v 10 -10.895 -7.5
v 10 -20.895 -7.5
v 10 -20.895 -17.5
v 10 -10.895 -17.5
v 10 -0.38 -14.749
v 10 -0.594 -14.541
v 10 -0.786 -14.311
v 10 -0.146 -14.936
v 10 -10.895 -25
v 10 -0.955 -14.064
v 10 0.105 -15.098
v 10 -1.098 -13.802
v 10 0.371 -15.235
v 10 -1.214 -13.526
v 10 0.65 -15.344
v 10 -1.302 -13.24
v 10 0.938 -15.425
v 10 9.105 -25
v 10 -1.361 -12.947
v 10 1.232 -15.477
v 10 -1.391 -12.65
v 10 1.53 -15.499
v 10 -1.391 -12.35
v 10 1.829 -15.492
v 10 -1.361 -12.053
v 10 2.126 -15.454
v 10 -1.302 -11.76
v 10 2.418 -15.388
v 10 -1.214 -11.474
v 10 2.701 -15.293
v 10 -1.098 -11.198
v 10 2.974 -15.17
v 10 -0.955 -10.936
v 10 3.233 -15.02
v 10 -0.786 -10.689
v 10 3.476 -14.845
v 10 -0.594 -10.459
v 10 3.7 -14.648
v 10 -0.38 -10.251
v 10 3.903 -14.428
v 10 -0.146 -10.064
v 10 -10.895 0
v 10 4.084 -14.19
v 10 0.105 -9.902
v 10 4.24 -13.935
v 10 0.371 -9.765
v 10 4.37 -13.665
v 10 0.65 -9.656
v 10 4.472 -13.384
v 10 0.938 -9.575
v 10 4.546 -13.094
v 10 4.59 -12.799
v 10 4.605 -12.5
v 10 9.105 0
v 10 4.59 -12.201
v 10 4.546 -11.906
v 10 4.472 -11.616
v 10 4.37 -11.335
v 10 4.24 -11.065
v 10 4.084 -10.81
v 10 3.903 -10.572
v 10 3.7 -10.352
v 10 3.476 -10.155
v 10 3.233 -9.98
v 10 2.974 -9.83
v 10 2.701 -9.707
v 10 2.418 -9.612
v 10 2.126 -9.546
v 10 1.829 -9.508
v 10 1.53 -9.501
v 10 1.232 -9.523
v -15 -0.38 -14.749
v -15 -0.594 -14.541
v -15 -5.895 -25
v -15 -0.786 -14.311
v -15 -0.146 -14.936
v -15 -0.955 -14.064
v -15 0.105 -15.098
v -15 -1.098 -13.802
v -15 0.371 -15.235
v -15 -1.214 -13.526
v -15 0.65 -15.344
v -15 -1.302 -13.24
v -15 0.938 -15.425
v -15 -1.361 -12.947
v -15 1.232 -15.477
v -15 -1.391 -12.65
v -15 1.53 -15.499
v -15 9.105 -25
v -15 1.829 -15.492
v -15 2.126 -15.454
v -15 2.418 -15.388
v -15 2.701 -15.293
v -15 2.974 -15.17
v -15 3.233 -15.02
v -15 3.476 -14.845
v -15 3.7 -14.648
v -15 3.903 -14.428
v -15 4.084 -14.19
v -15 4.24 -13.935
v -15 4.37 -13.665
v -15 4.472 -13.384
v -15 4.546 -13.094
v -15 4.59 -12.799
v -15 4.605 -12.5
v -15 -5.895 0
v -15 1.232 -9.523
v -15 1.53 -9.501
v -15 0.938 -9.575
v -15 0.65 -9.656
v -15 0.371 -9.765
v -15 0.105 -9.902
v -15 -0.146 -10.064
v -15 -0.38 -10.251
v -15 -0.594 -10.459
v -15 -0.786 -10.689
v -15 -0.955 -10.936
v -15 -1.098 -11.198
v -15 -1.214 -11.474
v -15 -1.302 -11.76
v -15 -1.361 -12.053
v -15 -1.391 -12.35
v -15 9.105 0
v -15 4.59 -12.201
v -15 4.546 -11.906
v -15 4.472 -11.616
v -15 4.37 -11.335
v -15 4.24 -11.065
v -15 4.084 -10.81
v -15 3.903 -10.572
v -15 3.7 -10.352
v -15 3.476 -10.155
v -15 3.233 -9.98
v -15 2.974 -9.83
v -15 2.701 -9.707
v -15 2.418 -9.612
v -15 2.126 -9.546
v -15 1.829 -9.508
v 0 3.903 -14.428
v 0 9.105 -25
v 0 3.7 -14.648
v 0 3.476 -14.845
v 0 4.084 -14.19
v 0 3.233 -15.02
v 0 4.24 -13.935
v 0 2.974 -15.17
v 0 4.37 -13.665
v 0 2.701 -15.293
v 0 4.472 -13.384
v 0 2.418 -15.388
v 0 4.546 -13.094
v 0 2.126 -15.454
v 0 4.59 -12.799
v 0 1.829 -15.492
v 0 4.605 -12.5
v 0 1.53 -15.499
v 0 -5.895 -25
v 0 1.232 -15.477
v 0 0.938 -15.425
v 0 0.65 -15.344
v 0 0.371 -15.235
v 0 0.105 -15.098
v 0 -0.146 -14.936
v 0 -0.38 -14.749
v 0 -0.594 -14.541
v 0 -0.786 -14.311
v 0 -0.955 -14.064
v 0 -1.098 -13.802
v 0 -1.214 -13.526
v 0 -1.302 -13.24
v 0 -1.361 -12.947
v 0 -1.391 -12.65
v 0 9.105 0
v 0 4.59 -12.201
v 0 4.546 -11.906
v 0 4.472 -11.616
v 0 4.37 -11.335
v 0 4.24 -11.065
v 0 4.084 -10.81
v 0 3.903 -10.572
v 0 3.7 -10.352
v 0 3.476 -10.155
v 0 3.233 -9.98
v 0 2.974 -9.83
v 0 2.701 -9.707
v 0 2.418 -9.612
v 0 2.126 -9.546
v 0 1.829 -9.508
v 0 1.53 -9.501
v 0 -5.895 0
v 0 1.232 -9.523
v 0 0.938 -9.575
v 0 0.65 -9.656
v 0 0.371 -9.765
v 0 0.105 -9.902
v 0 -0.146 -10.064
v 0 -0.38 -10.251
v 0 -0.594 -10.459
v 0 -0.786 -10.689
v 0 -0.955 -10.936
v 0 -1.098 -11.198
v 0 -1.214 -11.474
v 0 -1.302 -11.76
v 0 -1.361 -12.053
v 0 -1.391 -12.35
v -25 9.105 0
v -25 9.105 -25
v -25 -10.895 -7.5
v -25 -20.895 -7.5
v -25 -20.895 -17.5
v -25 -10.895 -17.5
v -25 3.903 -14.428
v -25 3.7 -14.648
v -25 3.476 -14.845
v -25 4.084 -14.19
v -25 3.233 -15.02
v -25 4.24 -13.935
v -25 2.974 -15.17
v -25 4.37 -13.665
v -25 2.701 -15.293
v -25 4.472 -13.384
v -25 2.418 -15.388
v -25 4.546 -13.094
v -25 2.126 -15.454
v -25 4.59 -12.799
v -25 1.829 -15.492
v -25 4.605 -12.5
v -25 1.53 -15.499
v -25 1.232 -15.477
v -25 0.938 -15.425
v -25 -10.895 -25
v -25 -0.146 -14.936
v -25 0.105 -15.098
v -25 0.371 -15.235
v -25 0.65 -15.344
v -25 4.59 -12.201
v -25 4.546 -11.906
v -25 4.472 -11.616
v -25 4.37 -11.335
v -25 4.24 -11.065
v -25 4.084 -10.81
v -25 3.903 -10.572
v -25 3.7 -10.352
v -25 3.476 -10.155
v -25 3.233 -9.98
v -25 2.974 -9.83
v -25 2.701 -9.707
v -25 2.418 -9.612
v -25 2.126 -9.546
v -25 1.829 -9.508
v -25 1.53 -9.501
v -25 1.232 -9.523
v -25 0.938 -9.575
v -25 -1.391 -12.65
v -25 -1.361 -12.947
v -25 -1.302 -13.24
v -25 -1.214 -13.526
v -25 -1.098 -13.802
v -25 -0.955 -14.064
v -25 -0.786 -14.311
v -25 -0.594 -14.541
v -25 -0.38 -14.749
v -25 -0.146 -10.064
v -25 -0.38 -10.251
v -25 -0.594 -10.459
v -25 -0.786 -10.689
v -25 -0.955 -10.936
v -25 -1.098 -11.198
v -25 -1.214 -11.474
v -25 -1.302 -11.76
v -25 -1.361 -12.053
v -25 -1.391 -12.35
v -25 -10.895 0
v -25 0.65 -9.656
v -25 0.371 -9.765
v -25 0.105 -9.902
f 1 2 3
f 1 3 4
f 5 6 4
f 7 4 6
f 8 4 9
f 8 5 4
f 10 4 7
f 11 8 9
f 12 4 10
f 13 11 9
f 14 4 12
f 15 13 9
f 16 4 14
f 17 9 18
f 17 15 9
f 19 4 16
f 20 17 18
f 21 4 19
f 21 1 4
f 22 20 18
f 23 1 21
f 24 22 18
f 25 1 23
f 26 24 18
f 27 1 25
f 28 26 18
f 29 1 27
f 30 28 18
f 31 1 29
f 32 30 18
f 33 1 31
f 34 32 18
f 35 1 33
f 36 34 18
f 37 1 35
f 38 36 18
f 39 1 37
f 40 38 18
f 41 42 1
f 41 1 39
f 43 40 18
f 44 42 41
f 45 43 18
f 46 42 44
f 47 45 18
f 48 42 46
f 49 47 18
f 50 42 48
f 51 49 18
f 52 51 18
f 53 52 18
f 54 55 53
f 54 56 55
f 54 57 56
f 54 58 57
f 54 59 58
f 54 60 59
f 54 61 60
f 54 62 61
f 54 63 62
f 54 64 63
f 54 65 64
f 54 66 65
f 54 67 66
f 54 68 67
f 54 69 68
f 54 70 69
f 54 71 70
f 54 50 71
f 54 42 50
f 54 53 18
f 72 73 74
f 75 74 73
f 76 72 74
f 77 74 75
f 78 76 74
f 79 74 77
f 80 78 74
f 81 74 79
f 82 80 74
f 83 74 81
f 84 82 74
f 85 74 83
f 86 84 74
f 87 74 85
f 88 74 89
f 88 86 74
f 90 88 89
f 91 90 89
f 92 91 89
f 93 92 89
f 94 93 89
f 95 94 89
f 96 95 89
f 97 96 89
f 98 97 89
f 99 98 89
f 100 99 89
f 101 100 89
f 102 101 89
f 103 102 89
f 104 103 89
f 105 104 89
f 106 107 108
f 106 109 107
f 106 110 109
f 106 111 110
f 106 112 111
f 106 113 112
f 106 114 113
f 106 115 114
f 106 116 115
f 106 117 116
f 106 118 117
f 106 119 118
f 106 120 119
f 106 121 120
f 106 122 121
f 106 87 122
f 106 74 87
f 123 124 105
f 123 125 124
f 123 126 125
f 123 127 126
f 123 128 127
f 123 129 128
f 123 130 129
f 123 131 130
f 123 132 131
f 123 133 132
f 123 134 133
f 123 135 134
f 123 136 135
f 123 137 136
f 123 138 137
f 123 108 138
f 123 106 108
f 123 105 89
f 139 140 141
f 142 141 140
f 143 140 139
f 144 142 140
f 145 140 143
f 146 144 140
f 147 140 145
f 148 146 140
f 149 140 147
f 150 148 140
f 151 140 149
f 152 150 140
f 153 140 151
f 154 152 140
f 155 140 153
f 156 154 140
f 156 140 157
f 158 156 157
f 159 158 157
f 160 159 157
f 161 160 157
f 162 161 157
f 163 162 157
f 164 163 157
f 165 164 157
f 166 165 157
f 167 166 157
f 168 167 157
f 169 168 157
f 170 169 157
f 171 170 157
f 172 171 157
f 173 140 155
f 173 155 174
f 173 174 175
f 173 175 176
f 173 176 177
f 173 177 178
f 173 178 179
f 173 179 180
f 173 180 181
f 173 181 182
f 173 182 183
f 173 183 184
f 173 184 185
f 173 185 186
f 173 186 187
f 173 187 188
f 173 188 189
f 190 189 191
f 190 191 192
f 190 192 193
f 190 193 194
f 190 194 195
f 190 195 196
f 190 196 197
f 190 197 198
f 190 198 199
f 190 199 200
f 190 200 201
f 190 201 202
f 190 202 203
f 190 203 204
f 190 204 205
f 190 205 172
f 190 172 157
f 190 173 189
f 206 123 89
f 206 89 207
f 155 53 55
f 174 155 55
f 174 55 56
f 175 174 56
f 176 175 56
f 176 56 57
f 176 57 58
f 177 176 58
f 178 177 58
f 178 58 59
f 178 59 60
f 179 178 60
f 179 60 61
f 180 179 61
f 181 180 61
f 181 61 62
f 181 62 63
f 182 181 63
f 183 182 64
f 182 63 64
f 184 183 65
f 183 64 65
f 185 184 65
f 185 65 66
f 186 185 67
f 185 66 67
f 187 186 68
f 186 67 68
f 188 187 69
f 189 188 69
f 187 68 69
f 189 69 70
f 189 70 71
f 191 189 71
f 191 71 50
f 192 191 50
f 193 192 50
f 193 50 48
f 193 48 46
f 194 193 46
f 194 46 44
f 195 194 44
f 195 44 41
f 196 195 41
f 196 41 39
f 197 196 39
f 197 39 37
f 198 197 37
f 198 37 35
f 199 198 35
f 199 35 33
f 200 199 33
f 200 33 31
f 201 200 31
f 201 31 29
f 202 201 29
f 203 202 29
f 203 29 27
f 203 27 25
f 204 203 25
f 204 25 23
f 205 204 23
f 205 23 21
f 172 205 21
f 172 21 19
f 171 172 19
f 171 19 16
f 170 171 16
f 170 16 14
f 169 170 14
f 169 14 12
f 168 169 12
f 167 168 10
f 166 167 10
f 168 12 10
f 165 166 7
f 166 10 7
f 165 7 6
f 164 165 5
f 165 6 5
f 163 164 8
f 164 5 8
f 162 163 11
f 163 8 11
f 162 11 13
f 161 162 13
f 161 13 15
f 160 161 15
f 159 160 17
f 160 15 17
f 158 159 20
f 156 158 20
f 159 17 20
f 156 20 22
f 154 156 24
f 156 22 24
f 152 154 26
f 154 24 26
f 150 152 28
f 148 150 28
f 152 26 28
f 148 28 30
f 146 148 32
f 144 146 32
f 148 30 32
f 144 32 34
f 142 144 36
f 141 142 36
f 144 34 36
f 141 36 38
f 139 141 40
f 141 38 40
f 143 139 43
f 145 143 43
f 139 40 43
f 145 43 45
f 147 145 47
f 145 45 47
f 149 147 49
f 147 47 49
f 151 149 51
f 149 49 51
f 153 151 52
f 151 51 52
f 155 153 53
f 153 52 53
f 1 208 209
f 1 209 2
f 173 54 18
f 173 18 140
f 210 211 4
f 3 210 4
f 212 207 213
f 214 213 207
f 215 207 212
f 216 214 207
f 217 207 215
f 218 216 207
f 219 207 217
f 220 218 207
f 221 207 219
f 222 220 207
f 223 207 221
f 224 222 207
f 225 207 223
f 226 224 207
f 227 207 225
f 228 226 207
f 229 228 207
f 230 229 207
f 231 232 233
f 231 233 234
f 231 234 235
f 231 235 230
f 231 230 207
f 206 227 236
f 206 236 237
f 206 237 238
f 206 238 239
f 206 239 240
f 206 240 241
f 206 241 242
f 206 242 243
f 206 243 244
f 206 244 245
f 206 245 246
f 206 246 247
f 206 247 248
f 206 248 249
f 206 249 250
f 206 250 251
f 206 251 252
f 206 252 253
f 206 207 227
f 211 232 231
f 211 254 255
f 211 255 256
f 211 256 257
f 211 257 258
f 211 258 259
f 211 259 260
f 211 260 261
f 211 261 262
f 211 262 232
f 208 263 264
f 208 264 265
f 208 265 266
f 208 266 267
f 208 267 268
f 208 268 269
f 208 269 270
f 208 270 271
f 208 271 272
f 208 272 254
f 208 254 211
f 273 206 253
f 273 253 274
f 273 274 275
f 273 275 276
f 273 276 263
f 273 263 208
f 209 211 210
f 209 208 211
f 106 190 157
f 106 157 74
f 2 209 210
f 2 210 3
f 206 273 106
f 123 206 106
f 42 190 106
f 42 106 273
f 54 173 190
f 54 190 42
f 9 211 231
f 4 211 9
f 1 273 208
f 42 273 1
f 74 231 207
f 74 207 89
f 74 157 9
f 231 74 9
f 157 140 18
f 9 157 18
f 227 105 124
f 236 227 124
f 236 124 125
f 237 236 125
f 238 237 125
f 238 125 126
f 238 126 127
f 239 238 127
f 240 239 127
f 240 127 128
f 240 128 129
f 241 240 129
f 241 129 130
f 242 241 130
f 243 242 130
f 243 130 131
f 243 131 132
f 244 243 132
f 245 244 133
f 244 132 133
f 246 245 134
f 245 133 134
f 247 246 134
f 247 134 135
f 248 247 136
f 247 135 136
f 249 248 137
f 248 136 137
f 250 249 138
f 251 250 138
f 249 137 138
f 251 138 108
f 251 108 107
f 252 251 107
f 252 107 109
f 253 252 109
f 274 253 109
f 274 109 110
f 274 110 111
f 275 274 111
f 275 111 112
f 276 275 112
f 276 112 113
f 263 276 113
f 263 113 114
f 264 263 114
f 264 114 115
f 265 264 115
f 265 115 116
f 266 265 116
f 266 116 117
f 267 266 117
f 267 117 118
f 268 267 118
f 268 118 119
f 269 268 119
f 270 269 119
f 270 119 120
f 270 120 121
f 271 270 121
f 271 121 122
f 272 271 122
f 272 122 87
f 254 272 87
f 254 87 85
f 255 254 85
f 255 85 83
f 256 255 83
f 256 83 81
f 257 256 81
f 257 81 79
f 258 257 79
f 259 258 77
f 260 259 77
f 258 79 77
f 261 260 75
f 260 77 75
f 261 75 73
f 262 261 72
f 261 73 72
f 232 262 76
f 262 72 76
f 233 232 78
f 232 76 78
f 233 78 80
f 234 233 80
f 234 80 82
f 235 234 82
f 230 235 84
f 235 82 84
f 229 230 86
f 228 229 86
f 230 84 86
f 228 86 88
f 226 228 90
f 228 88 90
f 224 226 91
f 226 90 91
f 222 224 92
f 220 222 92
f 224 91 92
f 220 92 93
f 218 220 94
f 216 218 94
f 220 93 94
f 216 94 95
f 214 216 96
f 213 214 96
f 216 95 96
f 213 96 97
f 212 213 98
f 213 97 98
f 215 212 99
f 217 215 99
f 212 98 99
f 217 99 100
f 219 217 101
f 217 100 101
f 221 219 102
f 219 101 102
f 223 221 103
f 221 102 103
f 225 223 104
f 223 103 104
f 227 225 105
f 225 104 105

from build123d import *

# Parameters (mm, degrees)
BOSS_EXTRUDE1_DEPTH = 25
SKETCH4_R           = 3
CUT_EXTRUDE1_DEPTH  = 40
SKETCH5_W           = 35
SKETCH5_H           = 10
BOSS_EXTRUDE3_DEPTH = 10


with BuildPart() as part:
    # Sketch1 → Boss-Extrude1 (new body)
    with BuildSketch(Plane.XY):
        Polygon((0, 9.105075836), (0, -5.894924164), (-15, -5.894924164), (-15, 9.105075836), (-25, 9.105075836), (-25, -10.894924164), (10, -10.894924164), (10, 9.105075836), align=None)
    extrude(amount=-BOSS_EXTRUDE1_DEPTH)

    # Sketch4 → Cut-Extrude1 (cut)
    with BuildSketch(Plane(origin=(10, 0, 0), x_dir=(0, 0, -1), z_dir=(1, 0, 0))):
        with Locations(Location((12.5, 1.605075836, 0), (0, 0, 90))):
            Circle(SKETCH4_R)
    extrude(amount=-CUT_EXTRUDE1_DEPTH, mode=Mode.SUBTRACT)

    # Sketch5 → Boss-Extrude3 (add)
    with BuildSketch(Plane.XZ.offset(10.894924164)):
        with Locations((-7.5, -12.5)):
            Rectangle(SKETCH5_W, SKETCH5_H)
    extrude(amount=BOSS_EXTRUDE3_DEPTH)


solid = part.part
